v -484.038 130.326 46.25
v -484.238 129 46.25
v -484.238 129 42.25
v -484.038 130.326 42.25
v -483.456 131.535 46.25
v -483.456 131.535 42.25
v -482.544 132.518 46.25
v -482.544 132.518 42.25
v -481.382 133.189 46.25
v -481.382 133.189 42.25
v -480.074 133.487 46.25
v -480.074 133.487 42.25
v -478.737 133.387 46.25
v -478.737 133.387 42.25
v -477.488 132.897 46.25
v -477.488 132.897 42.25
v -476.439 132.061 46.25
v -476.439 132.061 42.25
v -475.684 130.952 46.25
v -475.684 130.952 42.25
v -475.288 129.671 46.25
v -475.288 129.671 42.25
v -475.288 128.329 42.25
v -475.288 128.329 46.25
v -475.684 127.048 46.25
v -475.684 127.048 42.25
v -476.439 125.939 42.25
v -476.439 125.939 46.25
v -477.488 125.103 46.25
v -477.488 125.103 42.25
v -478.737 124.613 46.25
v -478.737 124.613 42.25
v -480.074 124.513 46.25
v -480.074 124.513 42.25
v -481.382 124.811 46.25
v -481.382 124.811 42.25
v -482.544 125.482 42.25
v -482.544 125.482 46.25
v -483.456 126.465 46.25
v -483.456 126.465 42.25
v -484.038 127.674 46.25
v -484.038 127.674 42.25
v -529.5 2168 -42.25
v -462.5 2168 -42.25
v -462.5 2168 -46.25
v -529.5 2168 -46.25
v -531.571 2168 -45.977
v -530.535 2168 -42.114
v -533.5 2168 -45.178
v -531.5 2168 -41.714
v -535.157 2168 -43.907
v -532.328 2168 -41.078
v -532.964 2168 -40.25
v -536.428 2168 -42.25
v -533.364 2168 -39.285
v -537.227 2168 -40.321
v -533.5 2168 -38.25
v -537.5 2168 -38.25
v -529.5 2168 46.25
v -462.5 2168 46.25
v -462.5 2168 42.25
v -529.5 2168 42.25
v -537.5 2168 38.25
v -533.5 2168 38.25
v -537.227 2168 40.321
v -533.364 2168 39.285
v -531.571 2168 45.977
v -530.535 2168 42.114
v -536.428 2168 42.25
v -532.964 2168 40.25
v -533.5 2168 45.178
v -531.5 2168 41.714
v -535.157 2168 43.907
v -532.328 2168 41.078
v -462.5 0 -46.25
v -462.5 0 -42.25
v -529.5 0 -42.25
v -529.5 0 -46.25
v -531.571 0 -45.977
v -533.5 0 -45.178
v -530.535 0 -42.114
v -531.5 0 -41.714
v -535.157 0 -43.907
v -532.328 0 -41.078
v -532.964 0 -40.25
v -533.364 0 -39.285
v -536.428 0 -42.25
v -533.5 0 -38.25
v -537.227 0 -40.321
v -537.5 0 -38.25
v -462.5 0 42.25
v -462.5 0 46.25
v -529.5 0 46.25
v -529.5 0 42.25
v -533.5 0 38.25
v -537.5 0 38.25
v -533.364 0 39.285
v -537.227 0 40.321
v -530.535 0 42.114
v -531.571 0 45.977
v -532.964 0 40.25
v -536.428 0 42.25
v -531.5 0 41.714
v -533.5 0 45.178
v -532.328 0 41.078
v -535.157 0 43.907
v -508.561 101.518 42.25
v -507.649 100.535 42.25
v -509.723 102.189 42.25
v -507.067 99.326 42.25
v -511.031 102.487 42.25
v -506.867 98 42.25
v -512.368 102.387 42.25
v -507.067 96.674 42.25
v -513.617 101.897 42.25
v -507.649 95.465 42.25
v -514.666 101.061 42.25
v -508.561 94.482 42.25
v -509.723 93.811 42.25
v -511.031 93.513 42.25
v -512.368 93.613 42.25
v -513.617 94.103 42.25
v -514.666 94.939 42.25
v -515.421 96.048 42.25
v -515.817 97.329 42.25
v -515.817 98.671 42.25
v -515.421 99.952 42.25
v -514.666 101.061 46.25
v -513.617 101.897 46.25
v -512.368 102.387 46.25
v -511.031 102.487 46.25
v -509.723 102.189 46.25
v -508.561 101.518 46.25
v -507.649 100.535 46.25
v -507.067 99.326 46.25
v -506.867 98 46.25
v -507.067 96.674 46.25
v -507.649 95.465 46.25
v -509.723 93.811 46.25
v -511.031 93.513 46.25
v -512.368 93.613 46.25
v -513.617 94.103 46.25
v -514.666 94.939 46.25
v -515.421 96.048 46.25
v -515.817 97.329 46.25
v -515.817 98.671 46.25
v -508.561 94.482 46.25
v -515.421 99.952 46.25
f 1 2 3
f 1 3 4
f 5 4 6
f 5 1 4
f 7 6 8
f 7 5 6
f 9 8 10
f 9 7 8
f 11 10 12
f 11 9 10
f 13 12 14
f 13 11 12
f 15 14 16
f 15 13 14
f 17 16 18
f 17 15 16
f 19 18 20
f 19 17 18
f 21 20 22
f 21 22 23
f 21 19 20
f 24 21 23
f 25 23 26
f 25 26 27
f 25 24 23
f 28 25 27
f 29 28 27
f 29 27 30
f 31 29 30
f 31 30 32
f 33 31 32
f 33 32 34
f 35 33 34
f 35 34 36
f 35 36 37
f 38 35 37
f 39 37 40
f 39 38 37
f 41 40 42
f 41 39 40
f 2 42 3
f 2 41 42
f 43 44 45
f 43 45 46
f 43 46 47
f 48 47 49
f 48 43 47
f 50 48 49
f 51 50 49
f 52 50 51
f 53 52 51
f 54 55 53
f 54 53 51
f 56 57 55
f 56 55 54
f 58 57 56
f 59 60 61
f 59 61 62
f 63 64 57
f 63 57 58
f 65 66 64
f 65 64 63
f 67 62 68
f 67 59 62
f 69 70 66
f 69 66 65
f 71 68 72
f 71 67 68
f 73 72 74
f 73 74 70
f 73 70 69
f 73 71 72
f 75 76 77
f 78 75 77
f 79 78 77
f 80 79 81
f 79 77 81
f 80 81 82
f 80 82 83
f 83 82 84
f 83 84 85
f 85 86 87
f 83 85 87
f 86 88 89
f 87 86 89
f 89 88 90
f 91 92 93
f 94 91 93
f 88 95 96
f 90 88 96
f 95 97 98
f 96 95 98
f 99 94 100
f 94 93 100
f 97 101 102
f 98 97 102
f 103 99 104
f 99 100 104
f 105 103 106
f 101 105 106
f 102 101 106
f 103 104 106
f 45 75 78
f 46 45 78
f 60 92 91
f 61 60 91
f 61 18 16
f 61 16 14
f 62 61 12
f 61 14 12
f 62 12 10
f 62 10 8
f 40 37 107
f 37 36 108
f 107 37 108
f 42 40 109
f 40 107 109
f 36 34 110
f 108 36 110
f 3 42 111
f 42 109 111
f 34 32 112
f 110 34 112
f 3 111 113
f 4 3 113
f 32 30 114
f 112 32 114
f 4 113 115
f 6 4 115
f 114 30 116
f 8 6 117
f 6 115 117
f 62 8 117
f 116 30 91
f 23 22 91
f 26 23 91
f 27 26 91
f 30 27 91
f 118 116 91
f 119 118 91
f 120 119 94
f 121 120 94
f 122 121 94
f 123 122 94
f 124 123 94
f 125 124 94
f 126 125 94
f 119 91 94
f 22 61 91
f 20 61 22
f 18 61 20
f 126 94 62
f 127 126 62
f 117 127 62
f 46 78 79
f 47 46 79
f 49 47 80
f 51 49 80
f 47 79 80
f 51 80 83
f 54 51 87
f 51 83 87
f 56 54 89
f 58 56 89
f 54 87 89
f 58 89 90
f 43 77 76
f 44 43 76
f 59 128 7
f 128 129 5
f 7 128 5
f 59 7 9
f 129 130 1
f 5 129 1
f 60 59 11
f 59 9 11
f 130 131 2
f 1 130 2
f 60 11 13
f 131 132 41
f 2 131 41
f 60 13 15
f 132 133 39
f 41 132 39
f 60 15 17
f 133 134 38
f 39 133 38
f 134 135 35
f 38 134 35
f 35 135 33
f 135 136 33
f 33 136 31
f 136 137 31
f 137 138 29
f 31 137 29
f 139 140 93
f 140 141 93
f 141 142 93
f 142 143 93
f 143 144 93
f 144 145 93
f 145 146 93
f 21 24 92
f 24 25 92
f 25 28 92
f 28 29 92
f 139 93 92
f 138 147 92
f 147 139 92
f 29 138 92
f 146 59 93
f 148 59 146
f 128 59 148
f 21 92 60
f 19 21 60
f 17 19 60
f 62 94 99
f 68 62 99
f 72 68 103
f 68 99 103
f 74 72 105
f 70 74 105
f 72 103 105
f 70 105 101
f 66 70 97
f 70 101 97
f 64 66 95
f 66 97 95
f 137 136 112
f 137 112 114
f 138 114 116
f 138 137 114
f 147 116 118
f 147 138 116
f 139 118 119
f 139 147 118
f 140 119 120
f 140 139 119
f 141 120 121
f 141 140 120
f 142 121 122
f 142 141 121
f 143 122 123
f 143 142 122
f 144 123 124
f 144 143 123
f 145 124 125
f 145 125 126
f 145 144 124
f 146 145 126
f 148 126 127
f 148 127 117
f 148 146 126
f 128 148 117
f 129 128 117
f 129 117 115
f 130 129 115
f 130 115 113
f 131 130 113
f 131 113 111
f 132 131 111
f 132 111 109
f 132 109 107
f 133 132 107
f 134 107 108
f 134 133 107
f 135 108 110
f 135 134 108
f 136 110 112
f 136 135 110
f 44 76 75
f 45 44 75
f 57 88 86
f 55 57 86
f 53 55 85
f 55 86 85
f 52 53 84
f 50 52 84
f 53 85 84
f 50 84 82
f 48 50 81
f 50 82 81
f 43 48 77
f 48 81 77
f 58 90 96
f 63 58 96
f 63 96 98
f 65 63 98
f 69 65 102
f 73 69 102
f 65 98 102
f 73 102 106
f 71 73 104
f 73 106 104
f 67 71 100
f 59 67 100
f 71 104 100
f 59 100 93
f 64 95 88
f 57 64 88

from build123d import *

# Parameters (mm, degrees)
F1_DEPTH = 2168
F4_R     = 4.5
F5_DEPTH = 4


with BuildPart() as f1:
    # F0 (on Front) → F1 (new body)
    with BuildSketch(Plane.XZ):
        with BuildLine():
            Line((-37.5, -42.25), (-37.5, -46.25))
            Line((-37.5, -46.25), (29.5, -46.25))
            ThreePointArc((29.5, -46.25), (35.1568542495, -43.9068542495), (37.5, -38.25))
            Line((37.5, -38.25), (37.5, 38.25))
            ThreePointArc((37.5, 38.25), (35.1568542495, 43.9068542495), (29.5, 46.25))
            Line((29.5, 46.25), (-37.5, 46.25))
            Line((-37.5, 46.25), (-37.5, 42.25))
            Line((-37.5, 42.25), (29.5, 42.25))
            ThreePointArc((29.5, 42.25), (32.3284271247, 41.0784271247), (33.5, 38.25))
            Line((33.5, 38.25), (33.5, -38.25))
            ThreePointArc((33.5, -38.25), (32.3284271247, -41.0784271247), (29.5, -42.25))
            Line((29.5, -42.25), (-37.5, -42.25))
        make_face()
    extrude(amount=-F1_DEPTH)

    # F4 (on offset) → F5 (cut, through all)
    with BuildSketch(Plane.XY.offset(46.25)):
        with BuildLine():
            ThreePointArc((15.867, 98), (11.367, 102.5), (6.867, 98))
            ThreePointArc((6.867, 98), (11.367, 93.5), (15.867, 98))
        make_face()
        with Locations((-20.2620720863, 129)):
            Circle(F4_R)
    extrude(amount=-F5_DEPTH, mode=Mode.SUBTRACT)


with BuildPart() as f7_1:
    # F7: instance of F1
    add(f1.part.mirror(Plane.YZ.offset(-250)))


solid = f7_1.part
